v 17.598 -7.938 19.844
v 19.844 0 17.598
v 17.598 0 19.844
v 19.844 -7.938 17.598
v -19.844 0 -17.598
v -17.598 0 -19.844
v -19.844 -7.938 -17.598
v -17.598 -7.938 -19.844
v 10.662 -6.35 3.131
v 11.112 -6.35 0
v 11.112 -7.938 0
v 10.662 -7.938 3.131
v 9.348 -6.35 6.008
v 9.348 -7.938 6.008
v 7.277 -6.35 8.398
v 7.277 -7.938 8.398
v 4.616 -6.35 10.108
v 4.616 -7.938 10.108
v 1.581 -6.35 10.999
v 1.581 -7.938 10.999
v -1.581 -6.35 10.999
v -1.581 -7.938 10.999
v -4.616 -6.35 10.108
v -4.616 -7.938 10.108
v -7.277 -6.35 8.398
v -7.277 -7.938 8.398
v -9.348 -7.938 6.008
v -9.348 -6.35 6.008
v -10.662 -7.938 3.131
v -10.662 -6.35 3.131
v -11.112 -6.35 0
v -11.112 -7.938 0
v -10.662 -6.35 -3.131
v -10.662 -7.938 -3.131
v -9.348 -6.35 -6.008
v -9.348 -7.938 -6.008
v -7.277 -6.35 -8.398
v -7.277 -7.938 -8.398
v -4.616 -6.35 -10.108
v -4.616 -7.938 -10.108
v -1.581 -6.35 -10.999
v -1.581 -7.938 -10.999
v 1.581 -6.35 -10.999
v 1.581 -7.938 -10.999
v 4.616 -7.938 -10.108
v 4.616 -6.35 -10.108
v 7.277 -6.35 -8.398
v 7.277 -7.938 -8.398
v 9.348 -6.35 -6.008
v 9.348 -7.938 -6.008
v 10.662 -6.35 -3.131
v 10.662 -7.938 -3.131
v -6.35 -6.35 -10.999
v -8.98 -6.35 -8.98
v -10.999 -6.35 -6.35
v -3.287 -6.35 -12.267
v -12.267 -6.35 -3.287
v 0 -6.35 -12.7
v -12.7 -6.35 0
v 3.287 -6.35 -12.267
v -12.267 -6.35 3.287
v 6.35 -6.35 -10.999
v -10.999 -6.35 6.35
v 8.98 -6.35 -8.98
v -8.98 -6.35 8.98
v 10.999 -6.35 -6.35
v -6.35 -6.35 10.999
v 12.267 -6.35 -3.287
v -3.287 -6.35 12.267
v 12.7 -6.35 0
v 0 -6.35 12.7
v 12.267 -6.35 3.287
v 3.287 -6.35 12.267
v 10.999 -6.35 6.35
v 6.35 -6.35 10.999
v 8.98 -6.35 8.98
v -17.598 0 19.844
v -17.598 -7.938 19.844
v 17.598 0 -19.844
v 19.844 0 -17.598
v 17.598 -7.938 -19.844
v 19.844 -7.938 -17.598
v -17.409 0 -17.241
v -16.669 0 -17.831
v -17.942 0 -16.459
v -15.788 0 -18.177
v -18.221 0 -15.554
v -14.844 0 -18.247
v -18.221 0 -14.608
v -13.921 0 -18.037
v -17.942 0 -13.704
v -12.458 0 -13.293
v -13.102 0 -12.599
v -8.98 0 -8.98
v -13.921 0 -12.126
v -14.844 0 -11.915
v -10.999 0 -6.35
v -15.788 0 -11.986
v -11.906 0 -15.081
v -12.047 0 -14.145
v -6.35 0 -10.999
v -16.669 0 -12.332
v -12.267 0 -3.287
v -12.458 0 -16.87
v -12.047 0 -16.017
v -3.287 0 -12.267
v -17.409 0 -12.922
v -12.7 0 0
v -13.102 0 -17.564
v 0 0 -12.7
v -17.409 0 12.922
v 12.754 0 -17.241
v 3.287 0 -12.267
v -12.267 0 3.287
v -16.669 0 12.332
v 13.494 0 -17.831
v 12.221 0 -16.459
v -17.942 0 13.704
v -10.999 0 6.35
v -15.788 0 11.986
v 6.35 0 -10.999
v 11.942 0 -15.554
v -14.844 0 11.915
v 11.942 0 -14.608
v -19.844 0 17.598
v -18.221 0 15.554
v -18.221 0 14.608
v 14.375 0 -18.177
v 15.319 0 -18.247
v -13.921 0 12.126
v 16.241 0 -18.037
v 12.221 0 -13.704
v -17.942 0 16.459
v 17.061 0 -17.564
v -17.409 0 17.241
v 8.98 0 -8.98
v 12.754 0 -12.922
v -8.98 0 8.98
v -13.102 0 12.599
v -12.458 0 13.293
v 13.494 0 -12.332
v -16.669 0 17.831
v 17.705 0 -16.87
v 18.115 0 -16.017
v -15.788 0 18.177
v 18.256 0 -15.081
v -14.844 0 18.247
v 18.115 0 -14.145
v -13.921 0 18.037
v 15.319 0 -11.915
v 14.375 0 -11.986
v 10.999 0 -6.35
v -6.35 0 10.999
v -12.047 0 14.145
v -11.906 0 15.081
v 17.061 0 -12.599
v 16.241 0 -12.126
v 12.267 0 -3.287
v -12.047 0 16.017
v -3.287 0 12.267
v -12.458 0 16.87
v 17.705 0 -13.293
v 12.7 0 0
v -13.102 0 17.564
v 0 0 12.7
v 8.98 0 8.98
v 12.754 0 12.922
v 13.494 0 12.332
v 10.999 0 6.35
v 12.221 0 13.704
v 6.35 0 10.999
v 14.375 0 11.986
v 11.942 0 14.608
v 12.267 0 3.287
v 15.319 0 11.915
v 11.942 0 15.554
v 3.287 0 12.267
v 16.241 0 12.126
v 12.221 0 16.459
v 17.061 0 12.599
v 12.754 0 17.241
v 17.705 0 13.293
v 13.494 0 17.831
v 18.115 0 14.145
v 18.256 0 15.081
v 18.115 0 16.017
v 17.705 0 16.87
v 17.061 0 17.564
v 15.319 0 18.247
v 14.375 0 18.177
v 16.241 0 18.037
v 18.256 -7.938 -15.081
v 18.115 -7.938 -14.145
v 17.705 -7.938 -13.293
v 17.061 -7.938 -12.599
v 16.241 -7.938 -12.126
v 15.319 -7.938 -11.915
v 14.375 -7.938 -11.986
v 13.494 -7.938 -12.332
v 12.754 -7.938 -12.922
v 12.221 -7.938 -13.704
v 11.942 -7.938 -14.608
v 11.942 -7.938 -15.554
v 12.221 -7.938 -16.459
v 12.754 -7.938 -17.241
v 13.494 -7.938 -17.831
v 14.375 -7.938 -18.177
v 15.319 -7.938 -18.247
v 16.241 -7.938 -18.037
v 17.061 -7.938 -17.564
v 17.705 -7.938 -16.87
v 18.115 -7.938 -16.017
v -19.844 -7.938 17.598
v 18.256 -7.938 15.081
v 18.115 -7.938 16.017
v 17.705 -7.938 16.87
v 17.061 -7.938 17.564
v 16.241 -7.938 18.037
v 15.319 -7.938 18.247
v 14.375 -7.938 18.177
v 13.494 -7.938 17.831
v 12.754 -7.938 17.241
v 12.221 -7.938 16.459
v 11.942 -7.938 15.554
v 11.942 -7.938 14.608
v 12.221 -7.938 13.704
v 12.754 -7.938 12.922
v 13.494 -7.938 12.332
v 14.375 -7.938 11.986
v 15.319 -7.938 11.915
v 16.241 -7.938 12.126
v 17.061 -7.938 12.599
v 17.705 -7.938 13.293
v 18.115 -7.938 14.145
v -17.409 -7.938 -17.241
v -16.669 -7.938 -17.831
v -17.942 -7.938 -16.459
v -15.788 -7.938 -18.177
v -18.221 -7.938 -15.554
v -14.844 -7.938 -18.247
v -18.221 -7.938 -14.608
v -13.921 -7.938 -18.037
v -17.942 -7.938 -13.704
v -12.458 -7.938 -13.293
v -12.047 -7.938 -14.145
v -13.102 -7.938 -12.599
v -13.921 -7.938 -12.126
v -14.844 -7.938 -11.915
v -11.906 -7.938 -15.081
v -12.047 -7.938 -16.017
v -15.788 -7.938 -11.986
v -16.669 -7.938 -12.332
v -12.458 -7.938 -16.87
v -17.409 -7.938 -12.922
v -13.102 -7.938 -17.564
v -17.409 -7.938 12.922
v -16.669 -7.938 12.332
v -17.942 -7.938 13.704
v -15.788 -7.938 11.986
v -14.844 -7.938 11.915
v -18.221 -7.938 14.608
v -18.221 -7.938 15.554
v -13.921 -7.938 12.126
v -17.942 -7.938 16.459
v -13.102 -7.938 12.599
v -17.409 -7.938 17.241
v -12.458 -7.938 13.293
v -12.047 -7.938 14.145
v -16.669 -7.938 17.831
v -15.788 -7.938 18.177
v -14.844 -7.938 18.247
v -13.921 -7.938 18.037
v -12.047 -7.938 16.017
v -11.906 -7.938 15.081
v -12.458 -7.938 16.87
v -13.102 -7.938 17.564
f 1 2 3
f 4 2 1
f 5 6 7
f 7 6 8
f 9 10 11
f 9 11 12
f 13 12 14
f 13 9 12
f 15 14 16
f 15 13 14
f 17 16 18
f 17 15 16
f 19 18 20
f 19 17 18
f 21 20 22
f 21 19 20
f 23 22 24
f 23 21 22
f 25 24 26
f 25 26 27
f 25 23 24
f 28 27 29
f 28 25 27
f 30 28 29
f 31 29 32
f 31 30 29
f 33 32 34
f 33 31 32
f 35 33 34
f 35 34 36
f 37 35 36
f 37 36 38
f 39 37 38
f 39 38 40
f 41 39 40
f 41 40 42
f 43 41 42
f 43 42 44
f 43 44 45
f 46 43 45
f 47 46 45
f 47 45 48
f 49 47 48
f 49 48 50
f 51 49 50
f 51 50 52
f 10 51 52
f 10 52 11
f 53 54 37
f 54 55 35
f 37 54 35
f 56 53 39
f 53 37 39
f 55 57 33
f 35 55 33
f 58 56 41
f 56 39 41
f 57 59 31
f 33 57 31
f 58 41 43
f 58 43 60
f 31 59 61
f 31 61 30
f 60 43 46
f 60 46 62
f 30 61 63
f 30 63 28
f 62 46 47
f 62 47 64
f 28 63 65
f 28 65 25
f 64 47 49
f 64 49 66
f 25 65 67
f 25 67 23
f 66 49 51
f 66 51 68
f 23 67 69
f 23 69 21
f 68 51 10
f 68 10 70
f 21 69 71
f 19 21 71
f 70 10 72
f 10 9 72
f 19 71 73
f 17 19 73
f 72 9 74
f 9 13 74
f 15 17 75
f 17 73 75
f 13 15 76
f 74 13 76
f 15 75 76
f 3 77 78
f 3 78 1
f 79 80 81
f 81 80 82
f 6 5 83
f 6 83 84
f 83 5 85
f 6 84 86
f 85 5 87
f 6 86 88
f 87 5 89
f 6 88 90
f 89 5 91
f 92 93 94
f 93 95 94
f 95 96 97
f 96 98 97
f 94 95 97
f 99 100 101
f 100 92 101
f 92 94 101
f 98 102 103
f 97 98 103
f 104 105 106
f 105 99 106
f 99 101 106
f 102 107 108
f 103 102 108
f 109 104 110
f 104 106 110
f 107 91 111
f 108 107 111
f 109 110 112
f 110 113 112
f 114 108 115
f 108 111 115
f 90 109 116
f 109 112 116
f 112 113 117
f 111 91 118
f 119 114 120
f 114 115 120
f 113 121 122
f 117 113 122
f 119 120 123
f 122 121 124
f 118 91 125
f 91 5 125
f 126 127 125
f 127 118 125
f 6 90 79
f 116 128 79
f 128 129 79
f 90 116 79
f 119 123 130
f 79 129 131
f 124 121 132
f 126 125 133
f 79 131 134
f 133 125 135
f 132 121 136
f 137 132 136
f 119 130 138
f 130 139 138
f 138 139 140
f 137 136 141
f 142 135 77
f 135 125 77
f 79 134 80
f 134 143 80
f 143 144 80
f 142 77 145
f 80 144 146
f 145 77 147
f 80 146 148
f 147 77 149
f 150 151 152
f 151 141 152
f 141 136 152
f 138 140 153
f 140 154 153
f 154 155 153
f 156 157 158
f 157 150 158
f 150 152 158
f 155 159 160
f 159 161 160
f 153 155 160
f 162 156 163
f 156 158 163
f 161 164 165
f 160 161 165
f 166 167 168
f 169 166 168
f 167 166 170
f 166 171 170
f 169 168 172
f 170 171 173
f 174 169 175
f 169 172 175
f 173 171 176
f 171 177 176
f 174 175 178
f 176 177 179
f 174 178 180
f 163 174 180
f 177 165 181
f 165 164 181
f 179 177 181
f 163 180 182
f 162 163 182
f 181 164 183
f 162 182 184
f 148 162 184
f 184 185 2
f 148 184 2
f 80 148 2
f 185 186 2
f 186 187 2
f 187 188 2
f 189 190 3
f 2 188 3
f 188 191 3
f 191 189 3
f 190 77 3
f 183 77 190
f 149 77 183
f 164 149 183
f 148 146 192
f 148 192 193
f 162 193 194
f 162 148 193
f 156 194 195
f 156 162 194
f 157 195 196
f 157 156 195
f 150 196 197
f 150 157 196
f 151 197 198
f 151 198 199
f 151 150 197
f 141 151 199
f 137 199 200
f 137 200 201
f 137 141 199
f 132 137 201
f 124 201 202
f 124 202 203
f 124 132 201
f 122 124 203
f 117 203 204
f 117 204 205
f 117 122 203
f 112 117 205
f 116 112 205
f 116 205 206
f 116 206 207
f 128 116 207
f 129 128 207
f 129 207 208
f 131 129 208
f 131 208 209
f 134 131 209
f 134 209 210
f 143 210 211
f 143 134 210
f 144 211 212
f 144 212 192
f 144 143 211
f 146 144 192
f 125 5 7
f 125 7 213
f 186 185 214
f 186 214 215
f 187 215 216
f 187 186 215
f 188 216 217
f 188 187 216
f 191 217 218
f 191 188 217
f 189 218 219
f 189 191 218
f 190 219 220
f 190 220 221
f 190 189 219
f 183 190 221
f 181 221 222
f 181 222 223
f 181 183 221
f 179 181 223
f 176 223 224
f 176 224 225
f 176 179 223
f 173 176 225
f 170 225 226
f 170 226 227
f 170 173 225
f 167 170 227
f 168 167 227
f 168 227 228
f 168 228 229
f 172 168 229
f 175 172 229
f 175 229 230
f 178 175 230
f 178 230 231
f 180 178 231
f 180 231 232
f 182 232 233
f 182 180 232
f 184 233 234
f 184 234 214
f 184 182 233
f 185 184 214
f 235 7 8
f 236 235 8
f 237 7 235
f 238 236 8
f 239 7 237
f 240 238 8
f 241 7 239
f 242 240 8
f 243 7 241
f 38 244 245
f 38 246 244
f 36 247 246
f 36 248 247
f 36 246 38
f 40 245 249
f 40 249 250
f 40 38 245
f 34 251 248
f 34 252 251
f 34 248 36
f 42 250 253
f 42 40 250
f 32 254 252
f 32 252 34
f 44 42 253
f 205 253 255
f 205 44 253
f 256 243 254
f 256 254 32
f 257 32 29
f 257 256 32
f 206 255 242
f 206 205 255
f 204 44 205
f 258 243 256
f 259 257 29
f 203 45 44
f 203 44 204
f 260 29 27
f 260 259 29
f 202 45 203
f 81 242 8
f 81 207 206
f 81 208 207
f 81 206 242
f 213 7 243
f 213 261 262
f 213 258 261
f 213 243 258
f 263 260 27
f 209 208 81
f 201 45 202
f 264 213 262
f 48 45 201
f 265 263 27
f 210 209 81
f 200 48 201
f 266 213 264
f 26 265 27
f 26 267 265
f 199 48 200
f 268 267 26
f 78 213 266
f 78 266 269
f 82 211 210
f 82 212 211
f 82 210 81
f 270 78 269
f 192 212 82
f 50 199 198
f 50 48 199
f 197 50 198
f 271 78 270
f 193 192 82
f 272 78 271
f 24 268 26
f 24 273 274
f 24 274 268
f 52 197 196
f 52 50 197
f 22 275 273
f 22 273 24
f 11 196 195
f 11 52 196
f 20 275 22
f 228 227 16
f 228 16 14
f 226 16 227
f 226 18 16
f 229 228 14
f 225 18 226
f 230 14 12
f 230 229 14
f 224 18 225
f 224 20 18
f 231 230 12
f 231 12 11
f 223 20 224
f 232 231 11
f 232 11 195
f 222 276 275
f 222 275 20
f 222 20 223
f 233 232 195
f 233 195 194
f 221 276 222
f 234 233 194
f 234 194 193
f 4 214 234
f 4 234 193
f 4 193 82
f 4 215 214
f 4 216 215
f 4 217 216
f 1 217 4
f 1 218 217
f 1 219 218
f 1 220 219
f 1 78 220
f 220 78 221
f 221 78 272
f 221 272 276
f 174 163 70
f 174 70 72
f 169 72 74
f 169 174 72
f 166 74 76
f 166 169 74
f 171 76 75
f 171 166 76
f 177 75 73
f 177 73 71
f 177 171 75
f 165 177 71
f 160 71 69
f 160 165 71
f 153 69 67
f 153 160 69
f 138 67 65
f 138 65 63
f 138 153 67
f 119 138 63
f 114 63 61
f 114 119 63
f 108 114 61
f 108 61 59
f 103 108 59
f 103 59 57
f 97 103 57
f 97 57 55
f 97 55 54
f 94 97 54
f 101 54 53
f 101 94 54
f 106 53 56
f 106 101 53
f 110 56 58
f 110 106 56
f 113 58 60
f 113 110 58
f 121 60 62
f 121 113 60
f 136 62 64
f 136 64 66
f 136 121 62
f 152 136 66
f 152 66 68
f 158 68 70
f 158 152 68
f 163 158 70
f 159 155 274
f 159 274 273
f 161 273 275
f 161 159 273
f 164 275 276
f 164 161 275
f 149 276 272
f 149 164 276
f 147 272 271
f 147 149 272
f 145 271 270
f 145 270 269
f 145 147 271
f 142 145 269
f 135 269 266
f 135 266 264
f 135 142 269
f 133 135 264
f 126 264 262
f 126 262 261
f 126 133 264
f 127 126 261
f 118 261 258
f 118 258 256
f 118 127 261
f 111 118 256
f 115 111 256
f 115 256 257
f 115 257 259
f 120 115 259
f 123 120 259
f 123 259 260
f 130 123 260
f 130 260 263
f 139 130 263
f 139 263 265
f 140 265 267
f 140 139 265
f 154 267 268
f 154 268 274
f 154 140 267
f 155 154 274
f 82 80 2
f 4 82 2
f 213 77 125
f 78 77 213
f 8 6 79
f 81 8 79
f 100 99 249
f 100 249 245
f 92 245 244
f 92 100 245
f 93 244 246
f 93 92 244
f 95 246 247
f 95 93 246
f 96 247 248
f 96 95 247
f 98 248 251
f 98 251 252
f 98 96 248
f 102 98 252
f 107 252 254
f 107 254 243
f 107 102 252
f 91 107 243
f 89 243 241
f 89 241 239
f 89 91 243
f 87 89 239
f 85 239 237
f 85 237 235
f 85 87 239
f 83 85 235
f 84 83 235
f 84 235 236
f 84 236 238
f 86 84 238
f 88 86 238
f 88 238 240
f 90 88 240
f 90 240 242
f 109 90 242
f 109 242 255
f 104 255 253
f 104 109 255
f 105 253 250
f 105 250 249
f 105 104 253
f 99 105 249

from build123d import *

# Parameters (mm, degrees)
F0_W     = 39.6875
F0_H     = 39.6875
F0_R     = 3.175
F0_R_2   = 12.7
F0_R_3   = 11.1125
F1_DEPTH = 7.9375
F2_DEPTH = 6.35
F3_SIZE  = 2.245403


with BuildPart() as f1:
    # F0 (on Front) → F1 (new body)
    with BuildSketch(Plane.XZ):
        Rectangle(F0_W, F0_H)
        with Locations((-15.08125, -15.08125)):
            Circle(F0_R, mode=Mode.SUBTRACT)
        with Locations((15.08125, -15.08125)):
            Circle(F0_R, mode=Mode.SUBTRACT)
        with Locations((-15.08125, 15.08125)):
            Circle(F0_R, mode=Mode.SUBTRACT)
        Circle(F0_R_2, mode=Mode.SUBTRACT)
        with Locations((15.08125, 15.08125)):
            Circle(F0_R, mode=Mode.SUBTRACT)
        Circle(F0_R_2)
        Circle(F0_R_3, mode=Mode.SUBTRACT)
    extrude(amount=F1_DEPTH)

    # F0 (on Front) → F2 (cut)
    with BuildSketch(Plane.XZ):
        Circle(F0_R_2)
        Circle(F0_R_3, mode=Mode.SUBTRACT)
    extrude(amount=F2_DEPTH, mode=Mode.SUBTRACT)

    # F3
    f3_edges = [f1.edges().sort_by_distance(p)[0] for p in [
        (19.84375, -3.96875, 19.84375),
        (19.84375, -3.96875, -19.84375),
        (-19.84375, -3.96875, -19.84375),
        (-19.84375, -3.96875, 19.84375),
    ]]
    chamfer(f3_edges, length=F3_SIZE)


solid = f1.part
